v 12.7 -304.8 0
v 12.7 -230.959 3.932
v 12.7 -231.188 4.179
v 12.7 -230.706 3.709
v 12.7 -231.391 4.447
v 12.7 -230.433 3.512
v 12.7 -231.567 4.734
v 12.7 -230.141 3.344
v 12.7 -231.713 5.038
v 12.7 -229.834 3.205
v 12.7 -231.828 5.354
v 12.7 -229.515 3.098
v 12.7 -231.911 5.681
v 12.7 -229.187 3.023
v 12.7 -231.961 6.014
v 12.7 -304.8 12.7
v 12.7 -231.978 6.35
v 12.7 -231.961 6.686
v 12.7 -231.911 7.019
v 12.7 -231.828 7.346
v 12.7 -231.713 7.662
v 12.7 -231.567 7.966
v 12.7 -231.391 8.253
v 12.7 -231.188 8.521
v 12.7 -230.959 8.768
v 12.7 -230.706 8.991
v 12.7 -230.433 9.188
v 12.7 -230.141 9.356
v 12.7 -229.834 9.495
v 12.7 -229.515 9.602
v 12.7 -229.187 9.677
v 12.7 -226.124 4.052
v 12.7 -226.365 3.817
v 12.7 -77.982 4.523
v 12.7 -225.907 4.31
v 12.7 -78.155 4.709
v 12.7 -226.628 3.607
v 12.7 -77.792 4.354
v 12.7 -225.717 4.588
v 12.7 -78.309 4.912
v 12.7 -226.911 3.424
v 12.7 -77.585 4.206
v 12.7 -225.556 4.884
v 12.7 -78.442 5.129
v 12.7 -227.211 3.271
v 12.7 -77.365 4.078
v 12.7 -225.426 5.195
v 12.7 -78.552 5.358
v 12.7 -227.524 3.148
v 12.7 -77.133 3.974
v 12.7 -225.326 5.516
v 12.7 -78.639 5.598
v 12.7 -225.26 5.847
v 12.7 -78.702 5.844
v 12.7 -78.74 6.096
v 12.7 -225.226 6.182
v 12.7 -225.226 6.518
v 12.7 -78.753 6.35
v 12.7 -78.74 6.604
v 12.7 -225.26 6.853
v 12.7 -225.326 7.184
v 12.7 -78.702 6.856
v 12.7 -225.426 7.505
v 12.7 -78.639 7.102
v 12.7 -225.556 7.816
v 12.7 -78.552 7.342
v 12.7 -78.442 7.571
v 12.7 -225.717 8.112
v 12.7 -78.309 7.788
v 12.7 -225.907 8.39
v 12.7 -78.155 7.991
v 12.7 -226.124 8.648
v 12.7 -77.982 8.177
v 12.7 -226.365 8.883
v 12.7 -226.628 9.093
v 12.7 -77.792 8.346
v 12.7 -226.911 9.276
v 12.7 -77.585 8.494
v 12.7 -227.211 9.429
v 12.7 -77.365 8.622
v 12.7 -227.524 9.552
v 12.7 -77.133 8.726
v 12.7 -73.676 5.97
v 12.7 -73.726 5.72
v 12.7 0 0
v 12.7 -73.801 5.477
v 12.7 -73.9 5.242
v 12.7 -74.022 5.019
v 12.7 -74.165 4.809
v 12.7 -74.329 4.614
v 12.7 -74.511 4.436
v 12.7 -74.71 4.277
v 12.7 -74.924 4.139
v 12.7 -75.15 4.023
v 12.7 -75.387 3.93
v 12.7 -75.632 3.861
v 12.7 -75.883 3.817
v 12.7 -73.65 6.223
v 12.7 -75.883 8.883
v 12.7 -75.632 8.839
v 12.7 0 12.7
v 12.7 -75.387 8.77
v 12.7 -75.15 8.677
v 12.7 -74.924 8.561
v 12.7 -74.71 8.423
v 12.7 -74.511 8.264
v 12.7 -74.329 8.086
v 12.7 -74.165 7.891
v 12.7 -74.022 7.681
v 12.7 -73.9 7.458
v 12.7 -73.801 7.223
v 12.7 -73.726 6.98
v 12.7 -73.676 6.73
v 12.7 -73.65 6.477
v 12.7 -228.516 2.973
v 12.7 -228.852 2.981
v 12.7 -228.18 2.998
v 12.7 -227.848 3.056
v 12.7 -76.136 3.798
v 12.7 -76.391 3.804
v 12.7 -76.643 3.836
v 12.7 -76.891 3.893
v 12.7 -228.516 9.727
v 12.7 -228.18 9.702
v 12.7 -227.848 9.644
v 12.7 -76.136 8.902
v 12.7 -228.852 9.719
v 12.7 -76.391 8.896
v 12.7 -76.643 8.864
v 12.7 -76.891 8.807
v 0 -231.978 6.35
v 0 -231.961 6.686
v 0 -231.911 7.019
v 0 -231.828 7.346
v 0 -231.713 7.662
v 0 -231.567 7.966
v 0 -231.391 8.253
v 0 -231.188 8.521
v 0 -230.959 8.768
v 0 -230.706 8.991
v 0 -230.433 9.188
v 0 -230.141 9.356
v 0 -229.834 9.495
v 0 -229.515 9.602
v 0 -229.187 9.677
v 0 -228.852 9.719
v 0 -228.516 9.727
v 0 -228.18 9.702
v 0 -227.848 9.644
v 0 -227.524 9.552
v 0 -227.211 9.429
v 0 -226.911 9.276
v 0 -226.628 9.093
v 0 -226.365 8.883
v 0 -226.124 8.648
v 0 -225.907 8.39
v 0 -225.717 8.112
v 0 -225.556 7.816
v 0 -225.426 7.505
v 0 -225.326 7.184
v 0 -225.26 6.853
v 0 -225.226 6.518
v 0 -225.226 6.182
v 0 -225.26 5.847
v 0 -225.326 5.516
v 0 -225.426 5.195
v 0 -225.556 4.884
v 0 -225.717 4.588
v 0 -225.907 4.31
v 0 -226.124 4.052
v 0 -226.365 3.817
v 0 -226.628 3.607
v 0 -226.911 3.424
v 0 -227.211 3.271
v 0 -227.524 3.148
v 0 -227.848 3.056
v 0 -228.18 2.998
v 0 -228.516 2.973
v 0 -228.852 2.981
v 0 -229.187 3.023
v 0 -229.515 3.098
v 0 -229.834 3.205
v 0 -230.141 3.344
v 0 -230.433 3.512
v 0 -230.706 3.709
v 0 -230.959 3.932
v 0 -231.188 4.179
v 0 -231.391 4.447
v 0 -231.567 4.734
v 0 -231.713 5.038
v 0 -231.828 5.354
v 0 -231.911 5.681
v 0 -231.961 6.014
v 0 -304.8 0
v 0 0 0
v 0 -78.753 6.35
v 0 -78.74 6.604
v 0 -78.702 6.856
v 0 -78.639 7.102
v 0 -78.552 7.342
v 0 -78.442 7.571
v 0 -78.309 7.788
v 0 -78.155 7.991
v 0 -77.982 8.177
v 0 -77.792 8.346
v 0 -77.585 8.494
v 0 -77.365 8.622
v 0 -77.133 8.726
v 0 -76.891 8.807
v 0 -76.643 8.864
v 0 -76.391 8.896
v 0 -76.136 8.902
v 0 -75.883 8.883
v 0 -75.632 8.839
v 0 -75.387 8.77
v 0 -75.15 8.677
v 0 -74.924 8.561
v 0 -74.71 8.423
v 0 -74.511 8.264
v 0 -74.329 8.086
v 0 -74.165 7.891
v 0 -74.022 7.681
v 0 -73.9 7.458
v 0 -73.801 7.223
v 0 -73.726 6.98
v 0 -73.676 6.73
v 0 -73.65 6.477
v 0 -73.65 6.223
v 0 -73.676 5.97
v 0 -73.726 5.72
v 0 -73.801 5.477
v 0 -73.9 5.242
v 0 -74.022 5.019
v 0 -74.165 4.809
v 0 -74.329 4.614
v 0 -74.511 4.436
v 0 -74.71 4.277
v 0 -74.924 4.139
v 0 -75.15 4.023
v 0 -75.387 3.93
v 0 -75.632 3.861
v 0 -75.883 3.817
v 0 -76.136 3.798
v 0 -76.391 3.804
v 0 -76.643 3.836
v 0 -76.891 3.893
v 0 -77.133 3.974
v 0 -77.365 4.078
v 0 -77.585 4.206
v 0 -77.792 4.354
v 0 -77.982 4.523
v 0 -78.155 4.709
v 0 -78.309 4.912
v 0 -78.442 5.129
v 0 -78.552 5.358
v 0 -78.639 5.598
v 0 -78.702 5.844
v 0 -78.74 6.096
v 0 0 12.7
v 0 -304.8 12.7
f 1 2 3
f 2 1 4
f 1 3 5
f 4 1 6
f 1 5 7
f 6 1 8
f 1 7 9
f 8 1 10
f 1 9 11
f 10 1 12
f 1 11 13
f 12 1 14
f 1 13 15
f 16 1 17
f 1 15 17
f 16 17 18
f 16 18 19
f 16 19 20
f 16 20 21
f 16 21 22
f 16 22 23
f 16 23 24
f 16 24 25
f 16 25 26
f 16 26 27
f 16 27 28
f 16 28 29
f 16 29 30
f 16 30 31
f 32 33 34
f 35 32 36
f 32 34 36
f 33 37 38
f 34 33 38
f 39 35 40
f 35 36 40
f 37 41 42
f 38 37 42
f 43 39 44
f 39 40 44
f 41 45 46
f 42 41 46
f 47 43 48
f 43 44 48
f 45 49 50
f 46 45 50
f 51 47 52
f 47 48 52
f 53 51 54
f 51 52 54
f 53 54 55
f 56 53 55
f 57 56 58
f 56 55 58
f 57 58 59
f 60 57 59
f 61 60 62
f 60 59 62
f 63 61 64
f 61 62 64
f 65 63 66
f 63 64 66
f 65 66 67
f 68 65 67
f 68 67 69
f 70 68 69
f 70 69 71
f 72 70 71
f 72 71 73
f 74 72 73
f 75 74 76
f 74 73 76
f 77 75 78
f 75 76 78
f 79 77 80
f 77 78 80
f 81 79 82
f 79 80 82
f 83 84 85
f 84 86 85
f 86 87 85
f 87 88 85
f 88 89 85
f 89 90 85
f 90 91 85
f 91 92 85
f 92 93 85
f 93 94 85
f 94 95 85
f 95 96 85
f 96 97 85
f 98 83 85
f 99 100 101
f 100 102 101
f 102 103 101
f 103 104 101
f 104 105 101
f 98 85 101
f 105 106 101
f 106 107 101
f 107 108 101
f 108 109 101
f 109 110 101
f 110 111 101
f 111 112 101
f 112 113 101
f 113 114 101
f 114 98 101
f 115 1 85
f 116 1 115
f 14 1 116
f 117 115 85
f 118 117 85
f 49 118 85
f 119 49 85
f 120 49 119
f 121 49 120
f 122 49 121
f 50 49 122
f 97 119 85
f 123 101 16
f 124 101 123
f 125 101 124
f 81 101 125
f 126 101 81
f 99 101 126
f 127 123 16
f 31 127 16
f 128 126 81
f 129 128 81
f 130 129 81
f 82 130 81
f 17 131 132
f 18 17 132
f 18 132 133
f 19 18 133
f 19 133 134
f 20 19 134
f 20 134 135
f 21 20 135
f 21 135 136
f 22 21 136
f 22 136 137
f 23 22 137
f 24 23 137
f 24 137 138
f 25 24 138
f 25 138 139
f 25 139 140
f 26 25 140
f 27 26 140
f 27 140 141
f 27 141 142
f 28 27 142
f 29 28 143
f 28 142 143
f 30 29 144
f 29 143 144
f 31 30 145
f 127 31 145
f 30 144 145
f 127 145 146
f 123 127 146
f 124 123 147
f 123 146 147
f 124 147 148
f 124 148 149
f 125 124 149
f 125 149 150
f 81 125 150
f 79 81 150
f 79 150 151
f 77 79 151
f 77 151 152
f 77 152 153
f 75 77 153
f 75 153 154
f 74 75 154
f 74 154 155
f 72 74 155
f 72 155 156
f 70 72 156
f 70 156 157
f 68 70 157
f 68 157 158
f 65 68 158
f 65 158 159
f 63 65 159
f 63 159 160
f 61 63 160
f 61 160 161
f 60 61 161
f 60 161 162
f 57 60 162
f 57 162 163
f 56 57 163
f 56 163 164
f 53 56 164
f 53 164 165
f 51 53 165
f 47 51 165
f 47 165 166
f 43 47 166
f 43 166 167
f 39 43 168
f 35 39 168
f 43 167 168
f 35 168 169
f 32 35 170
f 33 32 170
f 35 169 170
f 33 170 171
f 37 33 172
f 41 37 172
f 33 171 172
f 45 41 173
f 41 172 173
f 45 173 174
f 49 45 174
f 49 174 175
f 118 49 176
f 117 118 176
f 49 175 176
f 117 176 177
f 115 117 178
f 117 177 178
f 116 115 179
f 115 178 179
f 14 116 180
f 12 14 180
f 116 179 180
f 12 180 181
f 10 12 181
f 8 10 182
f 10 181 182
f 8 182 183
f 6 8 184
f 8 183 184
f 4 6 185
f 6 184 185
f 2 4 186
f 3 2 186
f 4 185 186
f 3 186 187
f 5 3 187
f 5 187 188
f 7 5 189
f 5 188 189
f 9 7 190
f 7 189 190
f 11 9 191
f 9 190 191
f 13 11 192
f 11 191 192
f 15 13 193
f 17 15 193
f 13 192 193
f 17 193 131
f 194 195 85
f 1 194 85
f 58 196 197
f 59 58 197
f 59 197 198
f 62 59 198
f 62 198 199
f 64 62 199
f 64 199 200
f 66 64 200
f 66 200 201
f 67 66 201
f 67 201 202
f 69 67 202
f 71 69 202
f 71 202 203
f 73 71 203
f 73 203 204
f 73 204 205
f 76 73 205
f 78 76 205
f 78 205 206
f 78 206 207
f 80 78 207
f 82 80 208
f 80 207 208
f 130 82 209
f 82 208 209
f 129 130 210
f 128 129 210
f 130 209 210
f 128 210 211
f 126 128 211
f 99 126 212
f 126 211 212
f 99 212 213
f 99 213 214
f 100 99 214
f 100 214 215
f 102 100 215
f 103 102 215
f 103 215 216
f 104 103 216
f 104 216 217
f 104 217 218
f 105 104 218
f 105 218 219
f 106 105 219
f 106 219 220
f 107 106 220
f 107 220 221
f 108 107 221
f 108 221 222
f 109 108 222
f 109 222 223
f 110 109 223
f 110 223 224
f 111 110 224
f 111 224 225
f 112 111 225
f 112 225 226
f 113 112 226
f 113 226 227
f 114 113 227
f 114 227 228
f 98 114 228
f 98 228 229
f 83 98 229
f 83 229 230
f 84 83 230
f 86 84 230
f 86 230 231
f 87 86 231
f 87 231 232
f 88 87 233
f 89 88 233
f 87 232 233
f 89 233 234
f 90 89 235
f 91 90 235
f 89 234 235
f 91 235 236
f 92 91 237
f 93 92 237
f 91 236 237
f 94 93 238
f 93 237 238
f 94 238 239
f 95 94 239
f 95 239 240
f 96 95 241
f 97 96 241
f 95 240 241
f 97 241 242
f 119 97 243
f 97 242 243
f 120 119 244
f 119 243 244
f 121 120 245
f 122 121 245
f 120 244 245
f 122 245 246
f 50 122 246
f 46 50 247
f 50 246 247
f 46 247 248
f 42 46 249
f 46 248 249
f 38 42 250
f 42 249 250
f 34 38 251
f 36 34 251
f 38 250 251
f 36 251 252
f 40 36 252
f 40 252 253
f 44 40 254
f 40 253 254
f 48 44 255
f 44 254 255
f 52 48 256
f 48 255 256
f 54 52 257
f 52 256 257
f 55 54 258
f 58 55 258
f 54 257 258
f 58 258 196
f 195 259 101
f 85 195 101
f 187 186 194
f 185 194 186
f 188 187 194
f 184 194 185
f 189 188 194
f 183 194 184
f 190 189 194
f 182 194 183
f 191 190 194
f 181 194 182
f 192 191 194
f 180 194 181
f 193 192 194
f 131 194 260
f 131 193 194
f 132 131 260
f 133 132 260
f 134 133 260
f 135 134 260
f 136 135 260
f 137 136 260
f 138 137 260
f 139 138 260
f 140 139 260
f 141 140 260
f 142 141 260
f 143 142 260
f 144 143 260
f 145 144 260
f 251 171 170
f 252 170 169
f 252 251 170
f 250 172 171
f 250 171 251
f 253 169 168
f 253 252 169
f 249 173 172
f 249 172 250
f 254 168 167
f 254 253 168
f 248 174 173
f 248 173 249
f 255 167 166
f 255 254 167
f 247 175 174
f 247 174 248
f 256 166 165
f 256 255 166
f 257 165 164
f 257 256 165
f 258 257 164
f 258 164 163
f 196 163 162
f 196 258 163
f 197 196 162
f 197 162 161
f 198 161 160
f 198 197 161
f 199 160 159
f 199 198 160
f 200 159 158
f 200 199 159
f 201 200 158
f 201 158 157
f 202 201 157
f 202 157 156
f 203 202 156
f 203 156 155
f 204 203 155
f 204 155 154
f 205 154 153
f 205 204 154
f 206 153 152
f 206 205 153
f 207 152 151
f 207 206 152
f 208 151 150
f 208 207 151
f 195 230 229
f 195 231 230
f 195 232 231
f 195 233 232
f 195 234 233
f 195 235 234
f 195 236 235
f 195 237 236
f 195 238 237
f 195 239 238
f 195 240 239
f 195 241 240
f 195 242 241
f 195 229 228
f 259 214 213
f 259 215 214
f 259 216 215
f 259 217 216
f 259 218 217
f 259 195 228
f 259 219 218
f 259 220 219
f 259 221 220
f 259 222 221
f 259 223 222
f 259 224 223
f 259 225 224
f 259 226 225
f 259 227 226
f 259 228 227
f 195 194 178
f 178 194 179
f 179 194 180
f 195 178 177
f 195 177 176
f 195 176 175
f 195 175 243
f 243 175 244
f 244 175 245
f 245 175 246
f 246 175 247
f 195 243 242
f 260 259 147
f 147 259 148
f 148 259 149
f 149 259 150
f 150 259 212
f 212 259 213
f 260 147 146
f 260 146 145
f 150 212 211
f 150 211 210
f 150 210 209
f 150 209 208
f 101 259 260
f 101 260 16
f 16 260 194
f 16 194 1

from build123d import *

# Parameters (mm, degrees)
F0_W     = 12.7
F0_H     = 12.7
F1_DEPTH = 304.8
F3_D     = 6.7564
F4_D     = 5.1054


with BuildPart() as f1:
    # F0 (on Front) → F1 (new body)
    with BuildSketch(Plane.XZ):
        with Locations((6.35, 6.35)):
            Rectangle(F0_W, F0_H)
    extrude(amount=F1_DEPTH)

    # F3 (through all)
    with Locations(Plane.YZ.offset(12.7)):
        with Locations((-228.6, 6.35)):
            Hole(F3_D / 2)

    # F4 (through all)
    with Locations(Plane.YZ.offset(12.7)):
        with Locations((-76.2, 6.35)):
            Hole(F4_D / 2)


solid = f1.part
